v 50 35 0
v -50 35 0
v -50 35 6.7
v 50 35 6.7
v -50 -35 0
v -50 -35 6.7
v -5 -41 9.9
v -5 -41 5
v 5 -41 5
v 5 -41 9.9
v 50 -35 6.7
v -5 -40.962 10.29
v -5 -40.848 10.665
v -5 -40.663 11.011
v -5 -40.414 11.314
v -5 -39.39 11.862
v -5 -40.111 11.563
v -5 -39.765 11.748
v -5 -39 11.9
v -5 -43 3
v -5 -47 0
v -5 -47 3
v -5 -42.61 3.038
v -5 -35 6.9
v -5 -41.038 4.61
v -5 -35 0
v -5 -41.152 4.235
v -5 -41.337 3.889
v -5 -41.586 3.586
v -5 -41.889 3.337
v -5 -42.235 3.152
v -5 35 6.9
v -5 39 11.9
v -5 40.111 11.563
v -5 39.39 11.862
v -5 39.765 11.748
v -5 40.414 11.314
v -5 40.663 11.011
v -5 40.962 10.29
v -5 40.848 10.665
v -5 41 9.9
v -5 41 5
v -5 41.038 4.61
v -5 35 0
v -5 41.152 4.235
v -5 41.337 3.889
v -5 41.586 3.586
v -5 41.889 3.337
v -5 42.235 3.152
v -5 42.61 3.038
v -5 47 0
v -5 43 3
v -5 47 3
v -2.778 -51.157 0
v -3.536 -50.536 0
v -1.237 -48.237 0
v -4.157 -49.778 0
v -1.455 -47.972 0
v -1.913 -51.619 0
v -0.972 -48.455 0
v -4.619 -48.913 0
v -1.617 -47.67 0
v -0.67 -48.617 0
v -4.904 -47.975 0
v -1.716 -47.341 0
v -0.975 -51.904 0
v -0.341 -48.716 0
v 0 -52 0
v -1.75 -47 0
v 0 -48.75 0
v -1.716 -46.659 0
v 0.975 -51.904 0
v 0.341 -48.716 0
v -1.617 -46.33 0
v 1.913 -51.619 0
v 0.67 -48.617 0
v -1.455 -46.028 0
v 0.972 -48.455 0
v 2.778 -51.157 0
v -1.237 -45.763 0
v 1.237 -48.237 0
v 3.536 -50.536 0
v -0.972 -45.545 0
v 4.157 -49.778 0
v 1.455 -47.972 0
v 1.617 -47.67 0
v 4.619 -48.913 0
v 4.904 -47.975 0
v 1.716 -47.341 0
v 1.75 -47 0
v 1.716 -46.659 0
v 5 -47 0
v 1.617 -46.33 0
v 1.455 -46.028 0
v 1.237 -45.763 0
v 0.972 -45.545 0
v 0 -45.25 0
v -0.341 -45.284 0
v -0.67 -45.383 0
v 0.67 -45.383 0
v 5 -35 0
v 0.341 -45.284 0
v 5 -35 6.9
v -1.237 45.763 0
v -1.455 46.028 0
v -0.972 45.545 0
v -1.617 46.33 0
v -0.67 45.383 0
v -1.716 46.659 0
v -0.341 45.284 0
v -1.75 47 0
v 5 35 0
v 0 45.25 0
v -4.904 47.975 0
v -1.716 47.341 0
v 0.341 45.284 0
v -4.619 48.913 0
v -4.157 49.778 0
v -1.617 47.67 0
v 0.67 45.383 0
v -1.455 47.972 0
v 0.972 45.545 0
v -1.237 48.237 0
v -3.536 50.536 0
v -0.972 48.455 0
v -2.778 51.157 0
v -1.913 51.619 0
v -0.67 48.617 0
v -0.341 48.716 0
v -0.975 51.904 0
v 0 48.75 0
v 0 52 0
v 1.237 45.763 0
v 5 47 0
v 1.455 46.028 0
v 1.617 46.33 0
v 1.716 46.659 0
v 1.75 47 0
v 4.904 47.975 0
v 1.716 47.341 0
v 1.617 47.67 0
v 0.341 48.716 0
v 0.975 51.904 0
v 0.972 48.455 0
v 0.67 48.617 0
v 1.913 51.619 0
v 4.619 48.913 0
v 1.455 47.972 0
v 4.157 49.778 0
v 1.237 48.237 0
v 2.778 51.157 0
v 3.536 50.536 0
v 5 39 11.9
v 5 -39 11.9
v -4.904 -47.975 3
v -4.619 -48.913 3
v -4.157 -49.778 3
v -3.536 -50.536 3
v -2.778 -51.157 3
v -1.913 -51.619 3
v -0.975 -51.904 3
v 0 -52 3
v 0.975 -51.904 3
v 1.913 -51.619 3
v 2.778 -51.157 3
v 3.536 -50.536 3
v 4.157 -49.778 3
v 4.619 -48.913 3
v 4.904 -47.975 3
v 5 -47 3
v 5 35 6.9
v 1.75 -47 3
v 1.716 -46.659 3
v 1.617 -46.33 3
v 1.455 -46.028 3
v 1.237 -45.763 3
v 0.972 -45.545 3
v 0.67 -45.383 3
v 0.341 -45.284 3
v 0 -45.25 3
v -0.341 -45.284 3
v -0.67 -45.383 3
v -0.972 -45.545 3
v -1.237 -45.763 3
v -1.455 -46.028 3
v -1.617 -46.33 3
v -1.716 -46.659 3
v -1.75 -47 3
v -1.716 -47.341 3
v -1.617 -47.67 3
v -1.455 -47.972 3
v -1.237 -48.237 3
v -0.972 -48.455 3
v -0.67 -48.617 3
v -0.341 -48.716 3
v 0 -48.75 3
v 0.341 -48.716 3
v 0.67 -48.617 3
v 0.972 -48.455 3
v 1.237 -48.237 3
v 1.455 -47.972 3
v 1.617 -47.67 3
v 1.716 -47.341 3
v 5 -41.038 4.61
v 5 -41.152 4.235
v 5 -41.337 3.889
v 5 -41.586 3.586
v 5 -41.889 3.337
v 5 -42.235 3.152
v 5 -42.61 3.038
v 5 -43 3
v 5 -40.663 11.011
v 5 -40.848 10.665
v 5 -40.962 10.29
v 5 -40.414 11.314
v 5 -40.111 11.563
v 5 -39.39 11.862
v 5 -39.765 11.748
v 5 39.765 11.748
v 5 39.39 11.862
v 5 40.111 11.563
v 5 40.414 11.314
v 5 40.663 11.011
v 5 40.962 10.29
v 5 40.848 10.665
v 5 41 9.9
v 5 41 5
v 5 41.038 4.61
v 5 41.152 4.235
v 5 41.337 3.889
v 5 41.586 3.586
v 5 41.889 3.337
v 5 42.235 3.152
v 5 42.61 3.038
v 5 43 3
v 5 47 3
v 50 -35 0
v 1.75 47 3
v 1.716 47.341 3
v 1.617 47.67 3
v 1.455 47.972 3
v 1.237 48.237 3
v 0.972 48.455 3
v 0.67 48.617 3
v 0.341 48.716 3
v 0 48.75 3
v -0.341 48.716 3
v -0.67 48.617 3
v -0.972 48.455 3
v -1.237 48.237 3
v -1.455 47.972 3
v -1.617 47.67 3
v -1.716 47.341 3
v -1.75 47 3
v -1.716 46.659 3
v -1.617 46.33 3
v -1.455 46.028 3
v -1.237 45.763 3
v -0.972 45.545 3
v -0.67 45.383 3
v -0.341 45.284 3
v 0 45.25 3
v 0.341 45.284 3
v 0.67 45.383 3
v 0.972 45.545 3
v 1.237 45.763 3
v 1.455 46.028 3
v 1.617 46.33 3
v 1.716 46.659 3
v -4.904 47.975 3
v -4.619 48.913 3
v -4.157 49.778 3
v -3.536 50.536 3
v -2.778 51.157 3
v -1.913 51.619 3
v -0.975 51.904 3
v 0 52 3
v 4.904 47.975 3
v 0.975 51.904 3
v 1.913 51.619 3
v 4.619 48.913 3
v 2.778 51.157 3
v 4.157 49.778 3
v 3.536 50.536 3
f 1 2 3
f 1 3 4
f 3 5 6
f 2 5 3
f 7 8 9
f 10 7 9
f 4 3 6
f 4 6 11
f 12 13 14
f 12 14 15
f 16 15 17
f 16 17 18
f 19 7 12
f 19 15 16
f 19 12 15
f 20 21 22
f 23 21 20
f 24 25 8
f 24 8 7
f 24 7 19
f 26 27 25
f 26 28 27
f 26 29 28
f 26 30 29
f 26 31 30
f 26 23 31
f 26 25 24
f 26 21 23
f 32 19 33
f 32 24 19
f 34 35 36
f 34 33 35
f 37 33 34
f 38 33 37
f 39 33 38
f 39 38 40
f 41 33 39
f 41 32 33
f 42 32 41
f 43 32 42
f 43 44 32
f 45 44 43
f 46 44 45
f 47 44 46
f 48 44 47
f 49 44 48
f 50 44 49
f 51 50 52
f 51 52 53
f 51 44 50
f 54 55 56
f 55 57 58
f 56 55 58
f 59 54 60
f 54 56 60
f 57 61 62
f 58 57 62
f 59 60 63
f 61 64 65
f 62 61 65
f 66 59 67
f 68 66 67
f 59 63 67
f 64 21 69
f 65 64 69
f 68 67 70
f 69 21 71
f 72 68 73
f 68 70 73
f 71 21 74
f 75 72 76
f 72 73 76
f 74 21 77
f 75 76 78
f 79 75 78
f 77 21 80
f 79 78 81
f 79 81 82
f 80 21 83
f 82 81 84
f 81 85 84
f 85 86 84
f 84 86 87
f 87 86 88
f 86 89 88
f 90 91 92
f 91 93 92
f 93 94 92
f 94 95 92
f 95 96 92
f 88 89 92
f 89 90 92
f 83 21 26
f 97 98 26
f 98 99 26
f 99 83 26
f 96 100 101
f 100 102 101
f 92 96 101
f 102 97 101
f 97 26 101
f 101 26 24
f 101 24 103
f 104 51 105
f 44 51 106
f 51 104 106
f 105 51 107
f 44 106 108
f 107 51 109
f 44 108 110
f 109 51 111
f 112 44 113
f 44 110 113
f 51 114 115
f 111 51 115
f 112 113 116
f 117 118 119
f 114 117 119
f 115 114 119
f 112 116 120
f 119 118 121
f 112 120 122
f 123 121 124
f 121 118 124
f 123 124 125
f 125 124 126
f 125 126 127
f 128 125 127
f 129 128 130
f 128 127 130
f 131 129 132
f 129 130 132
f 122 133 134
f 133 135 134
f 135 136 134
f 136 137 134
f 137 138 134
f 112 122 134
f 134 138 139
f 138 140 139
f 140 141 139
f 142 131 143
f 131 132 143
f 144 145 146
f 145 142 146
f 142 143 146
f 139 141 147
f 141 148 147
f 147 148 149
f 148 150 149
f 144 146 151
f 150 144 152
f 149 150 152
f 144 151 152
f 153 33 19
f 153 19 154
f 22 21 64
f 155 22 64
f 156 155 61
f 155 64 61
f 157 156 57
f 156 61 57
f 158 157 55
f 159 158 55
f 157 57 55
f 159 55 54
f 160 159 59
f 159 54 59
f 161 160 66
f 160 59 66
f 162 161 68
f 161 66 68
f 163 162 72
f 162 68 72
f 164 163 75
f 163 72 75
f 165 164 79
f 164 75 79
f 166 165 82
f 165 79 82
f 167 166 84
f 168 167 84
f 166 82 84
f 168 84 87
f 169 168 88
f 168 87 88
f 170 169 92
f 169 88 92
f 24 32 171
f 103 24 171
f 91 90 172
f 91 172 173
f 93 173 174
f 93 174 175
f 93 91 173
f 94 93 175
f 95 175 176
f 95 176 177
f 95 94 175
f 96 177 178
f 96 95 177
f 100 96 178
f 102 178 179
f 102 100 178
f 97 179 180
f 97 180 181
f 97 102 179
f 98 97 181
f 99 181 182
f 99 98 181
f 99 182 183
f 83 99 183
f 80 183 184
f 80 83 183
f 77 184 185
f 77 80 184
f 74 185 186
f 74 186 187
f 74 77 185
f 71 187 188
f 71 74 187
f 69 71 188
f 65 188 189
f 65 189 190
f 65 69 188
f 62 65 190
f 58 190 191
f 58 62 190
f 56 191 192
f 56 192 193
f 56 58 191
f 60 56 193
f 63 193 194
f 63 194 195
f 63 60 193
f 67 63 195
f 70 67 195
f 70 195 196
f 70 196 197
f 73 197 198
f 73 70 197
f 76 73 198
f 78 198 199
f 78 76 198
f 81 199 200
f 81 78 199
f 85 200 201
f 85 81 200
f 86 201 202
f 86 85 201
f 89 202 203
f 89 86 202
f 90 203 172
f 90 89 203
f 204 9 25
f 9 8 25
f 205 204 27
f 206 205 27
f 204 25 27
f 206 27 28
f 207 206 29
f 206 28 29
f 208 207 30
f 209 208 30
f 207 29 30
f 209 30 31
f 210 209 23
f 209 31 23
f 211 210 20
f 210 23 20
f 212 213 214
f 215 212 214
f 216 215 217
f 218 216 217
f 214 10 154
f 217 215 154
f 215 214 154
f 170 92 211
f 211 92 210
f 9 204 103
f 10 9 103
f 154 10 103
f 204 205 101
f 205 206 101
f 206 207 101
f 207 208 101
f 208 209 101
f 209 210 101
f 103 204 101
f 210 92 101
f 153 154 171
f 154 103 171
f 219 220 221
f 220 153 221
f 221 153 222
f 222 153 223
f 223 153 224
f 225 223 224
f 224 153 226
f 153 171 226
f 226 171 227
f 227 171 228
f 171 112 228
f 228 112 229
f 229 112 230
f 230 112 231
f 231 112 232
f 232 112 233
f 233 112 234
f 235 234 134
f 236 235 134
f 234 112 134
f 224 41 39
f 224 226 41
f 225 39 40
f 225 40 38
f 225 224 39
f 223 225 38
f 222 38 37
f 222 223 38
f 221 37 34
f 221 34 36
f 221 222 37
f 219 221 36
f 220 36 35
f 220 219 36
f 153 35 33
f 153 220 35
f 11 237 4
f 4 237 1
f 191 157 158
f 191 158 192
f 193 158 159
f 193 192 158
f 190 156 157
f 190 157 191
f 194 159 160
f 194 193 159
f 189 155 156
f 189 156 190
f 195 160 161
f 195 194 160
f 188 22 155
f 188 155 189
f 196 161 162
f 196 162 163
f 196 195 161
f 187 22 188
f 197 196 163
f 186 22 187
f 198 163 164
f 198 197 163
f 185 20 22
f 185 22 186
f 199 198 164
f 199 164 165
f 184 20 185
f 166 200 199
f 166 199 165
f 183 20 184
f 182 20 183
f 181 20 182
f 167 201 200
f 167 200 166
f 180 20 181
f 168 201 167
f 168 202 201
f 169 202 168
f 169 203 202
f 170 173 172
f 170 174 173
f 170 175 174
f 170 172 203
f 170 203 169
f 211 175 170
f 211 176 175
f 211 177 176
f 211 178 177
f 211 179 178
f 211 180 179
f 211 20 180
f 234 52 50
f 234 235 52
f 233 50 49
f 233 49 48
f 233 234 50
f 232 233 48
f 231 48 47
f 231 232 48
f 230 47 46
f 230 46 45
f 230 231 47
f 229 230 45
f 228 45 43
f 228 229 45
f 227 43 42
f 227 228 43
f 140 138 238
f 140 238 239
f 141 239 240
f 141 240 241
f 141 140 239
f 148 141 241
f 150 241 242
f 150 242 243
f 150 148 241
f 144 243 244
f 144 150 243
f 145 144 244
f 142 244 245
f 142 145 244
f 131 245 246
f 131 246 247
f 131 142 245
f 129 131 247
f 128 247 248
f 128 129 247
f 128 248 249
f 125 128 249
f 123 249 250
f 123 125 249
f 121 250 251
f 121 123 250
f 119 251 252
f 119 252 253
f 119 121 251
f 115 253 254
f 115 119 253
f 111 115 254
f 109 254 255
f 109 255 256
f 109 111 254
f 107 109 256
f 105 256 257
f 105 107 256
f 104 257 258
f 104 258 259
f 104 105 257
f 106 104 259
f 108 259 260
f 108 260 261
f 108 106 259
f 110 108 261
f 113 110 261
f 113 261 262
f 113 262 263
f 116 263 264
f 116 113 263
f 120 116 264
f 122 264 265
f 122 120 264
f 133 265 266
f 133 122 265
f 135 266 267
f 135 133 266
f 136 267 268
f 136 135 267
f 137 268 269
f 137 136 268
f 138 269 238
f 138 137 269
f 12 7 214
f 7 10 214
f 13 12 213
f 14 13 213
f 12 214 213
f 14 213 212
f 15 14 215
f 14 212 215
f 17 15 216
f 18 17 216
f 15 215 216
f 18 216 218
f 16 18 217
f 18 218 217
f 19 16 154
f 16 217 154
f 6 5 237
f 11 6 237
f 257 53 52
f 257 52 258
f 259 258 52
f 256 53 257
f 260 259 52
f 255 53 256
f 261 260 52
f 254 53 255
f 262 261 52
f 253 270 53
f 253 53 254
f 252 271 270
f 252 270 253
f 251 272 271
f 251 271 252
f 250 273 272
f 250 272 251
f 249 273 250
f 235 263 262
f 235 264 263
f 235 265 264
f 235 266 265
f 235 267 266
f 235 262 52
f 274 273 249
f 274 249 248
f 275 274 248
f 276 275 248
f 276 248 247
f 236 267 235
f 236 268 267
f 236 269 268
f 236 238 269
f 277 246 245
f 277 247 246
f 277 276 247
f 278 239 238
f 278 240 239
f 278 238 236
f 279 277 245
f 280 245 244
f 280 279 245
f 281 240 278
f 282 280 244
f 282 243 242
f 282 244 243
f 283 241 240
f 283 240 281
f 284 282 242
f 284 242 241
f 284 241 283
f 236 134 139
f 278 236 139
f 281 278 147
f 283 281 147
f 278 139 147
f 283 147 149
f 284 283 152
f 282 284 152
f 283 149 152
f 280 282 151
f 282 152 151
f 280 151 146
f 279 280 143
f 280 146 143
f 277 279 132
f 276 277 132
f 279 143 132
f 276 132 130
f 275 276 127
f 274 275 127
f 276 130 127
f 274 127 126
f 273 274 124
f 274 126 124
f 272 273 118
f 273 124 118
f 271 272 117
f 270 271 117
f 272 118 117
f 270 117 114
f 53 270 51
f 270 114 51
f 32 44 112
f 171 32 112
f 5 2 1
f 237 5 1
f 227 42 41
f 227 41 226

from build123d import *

# Parameters (mm, degrees)
F0_W     = 100
F0_H     = 70
F1_DEPTH = 6.7
F2_R     = 1.75
F3_DEPTH = 3
F2_W     = 10
F2_H     = 6
F4_DEPTH = 6.9
F5_W     = 10
F5_H     = 82
F6_DEPTH = 5
F7_R     = 2


with BuildPart() as f1:
    # F0 (on Top) → F1 (new body)
    with BuildSketch(Plane.XY):
        Rectangle(F0_W, F0_H)
    extrude(amount=F1_DEPTH)


with BuildPart() as f3:
    # F2 (on Top) → F3 (new body)
    with BuildSketch(Plane.XY):
        with BuildLine():
            ThreePointArc((-5, 47), (0, 42), (5, 47))
            ThreePointArc((5, 47), (0, 52), (-5, 47))
        make_face()
        with Locations((0, 47)):
            Circle(F2_R, mode=Mode.SUBTRACT)
        with BuildLine():
            Line((5, 41), (5, 47))
            ThreePointArc((5, 47), (0, 42), (-5, 47))
            Line((-5, 47), (-5, 41))
            Line((-5, 41), (5, 41))
        make_face()
    extrude(amount=F3_DEPTH)

    # F2 (on Top) → F4 (join)
    with BuildSketch(Plane.XY):
        with Locations((0, 38)):
            Rectangle(F2_W, F2_H)
    extrude(amount=F4_DEPTH)



with BuildPart() as f3b:
    # F2 (on Top) → F3, piece 2 (new body)
    with BuildSketch(Plane.XY):
        with BuildLine():
            ThreePointArc((-5, -47), (0, -52), (5, -47))
            ThreePointArc((5, -47), (0, -42), (-5, -47))
        make_face()
        with Locations((0, -47)):
            Circle(F2_R, mode=Mode.SUBTRACT)
        with BuildLine():
            ThreePointArc((-5, -47), (0, -42), (5, -47))
            Line((5, -47), (5, -41))
            Line((5, -41), (-5, -41))
            Line((-5, -41), (-5, -47))
        make_face()
    extrude(amount=F3_DEPTH)

    # F2 (on Top) → F4, piece 2 (join)
    with BuildSketch(Plane.XY):
        with Locations((0, -38)):
            Rectangle(F2_W, F2_H)
    extrude(amount=F4_DEPTH)


with BuildPart() as f3_1:
    add(f3.part)

    add(f3b.part)  # F6 merges F3b
    # F5 (on face) → F6 (join)
    with BuildSketch(Plane.XY.offset(6.9)):
        Rectangle(F5_W, F5_H)
    extrude(amount=F6_DEPTH)

    # F7
    f7_edges = [f3_1.edges().sort_by_distance(p)[0] for p in [
        (0, 41, 11.9),
        (0, -41, 11.9),
        (0, -41, 3),
        (0, 41, 3),
    ]]
    fillet(f7_edges, radius=F7_R)


solid = Compound([f1.part, f3_1.part])
